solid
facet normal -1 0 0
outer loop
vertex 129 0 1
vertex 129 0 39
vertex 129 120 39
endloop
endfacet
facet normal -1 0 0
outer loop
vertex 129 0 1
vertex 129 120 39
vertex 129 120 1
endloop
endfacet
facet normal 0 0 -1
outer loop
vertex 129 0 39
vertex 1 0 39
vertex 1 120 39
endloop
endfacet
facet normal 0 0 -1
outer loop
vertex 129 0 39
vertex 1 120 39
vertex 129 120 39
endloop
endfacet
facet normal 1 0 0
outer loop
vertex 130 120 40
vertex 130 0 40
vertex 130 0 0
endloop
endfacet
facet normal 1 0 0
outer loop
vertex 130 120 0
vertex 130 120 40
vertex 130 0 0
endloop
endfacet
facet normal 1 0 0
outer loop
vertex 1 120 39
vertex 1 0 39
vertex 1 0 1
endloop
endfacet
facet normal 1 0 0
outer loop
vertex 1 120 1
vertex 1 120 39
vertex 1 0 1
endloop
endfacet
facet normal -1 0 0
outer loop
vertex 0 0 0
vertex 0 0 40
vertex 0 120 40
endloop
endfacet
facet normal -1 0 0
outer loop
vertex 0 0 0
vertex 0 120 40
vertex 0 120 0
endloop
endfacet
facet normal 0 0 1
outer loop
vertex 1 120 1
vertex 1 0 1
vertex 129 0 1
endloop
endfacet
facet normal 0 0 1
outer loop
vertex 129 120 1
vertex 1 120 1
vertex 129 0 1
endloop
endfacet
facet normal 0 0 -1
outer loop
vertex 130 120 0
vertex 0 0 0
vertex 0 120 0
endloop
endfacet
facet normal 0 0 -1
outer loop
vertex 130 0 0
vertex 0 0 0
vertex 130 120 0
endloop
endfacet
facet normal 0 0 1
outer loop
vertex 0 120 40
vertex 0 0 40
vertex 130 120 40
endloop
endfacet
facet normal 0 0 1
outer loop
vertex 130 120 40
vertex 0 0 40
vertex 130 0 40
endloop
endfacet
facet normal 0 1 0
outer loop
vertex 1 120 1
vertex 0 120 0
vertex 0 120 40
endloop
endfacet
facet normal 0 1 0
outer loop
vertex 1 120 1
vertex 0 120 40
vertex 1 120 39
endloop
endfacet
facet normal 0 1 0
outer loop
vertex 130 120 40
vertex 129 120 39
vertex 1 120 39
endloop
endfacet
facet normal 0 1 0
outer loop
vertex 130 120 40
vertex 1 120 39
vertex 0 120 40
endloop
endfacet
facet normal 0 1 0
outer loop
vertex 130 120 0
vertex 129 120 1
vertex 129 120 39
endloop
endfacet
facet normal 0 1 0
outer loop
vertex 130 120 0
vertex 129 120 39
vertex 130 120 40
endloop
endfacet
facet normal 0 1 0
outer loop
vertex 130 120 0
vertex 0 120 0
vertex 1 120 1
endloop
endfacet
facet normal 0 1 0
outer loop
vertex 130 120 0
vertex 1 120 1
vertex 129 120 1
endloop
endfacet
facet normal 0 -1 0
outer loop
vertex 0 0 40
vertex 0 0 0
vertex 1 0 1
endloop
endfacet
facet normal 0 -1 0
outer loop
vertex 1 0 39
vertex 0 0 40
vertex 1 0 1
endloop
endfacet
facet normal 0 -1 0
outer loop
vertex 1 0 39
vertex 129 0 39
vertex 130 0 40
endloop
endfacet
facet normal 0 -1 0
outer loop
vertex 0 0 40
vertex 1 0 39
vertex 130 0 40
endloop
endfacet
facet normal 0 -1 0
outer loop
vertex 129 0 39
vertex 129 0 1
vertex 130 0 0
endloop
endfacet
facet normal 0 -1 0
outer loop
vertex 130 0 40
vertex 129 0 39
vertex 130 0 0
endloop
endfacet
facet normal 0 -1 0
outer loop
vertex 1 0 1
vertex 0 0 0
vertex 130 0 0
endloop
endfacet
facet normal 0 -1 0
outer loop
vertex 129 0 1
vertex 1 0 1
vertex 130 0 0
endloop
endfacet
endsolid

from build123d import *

# Parameters (mm, degrees)
RECTANGLE001_W   = 128
RECTANGLE001_H   = 38
EXTRUDE001_DEPTH = 124
RECTANGLE_W      = 130
RECTANGLE_H      = 40
EXTRUDE_DEPTH    = 120


with BuildPart() as extrude001:
    # Rectangle001 → Extrude001 (new body)
    with BuildSketch(Plane(origin=(65, -2, 20), x_dir=(1, 0, 0), z_dir=(0, 1, 0))):
        Rectangle(RECTANGLE001_W, RECTANGLE001_H)
    extrude(amount=EXTRUDE001_DEPTH)


with BuildPart() as cut:
    # Rectangle → Extrude (new body)
    with BuildSketch(Plane(origin=(65, 0, 20), x_dir=(1, 0, 0), z_dir=(0, 1, 0))):
        Rectangle(RECTANGLE_W, RECTANGLE_H)
    extrude(amount=EXTRUDE_DEPTH)

    # Cut: cut Extrude001
    add(extrude001.part, mode=Mode.SUBTRACT)


solid = cut.part
